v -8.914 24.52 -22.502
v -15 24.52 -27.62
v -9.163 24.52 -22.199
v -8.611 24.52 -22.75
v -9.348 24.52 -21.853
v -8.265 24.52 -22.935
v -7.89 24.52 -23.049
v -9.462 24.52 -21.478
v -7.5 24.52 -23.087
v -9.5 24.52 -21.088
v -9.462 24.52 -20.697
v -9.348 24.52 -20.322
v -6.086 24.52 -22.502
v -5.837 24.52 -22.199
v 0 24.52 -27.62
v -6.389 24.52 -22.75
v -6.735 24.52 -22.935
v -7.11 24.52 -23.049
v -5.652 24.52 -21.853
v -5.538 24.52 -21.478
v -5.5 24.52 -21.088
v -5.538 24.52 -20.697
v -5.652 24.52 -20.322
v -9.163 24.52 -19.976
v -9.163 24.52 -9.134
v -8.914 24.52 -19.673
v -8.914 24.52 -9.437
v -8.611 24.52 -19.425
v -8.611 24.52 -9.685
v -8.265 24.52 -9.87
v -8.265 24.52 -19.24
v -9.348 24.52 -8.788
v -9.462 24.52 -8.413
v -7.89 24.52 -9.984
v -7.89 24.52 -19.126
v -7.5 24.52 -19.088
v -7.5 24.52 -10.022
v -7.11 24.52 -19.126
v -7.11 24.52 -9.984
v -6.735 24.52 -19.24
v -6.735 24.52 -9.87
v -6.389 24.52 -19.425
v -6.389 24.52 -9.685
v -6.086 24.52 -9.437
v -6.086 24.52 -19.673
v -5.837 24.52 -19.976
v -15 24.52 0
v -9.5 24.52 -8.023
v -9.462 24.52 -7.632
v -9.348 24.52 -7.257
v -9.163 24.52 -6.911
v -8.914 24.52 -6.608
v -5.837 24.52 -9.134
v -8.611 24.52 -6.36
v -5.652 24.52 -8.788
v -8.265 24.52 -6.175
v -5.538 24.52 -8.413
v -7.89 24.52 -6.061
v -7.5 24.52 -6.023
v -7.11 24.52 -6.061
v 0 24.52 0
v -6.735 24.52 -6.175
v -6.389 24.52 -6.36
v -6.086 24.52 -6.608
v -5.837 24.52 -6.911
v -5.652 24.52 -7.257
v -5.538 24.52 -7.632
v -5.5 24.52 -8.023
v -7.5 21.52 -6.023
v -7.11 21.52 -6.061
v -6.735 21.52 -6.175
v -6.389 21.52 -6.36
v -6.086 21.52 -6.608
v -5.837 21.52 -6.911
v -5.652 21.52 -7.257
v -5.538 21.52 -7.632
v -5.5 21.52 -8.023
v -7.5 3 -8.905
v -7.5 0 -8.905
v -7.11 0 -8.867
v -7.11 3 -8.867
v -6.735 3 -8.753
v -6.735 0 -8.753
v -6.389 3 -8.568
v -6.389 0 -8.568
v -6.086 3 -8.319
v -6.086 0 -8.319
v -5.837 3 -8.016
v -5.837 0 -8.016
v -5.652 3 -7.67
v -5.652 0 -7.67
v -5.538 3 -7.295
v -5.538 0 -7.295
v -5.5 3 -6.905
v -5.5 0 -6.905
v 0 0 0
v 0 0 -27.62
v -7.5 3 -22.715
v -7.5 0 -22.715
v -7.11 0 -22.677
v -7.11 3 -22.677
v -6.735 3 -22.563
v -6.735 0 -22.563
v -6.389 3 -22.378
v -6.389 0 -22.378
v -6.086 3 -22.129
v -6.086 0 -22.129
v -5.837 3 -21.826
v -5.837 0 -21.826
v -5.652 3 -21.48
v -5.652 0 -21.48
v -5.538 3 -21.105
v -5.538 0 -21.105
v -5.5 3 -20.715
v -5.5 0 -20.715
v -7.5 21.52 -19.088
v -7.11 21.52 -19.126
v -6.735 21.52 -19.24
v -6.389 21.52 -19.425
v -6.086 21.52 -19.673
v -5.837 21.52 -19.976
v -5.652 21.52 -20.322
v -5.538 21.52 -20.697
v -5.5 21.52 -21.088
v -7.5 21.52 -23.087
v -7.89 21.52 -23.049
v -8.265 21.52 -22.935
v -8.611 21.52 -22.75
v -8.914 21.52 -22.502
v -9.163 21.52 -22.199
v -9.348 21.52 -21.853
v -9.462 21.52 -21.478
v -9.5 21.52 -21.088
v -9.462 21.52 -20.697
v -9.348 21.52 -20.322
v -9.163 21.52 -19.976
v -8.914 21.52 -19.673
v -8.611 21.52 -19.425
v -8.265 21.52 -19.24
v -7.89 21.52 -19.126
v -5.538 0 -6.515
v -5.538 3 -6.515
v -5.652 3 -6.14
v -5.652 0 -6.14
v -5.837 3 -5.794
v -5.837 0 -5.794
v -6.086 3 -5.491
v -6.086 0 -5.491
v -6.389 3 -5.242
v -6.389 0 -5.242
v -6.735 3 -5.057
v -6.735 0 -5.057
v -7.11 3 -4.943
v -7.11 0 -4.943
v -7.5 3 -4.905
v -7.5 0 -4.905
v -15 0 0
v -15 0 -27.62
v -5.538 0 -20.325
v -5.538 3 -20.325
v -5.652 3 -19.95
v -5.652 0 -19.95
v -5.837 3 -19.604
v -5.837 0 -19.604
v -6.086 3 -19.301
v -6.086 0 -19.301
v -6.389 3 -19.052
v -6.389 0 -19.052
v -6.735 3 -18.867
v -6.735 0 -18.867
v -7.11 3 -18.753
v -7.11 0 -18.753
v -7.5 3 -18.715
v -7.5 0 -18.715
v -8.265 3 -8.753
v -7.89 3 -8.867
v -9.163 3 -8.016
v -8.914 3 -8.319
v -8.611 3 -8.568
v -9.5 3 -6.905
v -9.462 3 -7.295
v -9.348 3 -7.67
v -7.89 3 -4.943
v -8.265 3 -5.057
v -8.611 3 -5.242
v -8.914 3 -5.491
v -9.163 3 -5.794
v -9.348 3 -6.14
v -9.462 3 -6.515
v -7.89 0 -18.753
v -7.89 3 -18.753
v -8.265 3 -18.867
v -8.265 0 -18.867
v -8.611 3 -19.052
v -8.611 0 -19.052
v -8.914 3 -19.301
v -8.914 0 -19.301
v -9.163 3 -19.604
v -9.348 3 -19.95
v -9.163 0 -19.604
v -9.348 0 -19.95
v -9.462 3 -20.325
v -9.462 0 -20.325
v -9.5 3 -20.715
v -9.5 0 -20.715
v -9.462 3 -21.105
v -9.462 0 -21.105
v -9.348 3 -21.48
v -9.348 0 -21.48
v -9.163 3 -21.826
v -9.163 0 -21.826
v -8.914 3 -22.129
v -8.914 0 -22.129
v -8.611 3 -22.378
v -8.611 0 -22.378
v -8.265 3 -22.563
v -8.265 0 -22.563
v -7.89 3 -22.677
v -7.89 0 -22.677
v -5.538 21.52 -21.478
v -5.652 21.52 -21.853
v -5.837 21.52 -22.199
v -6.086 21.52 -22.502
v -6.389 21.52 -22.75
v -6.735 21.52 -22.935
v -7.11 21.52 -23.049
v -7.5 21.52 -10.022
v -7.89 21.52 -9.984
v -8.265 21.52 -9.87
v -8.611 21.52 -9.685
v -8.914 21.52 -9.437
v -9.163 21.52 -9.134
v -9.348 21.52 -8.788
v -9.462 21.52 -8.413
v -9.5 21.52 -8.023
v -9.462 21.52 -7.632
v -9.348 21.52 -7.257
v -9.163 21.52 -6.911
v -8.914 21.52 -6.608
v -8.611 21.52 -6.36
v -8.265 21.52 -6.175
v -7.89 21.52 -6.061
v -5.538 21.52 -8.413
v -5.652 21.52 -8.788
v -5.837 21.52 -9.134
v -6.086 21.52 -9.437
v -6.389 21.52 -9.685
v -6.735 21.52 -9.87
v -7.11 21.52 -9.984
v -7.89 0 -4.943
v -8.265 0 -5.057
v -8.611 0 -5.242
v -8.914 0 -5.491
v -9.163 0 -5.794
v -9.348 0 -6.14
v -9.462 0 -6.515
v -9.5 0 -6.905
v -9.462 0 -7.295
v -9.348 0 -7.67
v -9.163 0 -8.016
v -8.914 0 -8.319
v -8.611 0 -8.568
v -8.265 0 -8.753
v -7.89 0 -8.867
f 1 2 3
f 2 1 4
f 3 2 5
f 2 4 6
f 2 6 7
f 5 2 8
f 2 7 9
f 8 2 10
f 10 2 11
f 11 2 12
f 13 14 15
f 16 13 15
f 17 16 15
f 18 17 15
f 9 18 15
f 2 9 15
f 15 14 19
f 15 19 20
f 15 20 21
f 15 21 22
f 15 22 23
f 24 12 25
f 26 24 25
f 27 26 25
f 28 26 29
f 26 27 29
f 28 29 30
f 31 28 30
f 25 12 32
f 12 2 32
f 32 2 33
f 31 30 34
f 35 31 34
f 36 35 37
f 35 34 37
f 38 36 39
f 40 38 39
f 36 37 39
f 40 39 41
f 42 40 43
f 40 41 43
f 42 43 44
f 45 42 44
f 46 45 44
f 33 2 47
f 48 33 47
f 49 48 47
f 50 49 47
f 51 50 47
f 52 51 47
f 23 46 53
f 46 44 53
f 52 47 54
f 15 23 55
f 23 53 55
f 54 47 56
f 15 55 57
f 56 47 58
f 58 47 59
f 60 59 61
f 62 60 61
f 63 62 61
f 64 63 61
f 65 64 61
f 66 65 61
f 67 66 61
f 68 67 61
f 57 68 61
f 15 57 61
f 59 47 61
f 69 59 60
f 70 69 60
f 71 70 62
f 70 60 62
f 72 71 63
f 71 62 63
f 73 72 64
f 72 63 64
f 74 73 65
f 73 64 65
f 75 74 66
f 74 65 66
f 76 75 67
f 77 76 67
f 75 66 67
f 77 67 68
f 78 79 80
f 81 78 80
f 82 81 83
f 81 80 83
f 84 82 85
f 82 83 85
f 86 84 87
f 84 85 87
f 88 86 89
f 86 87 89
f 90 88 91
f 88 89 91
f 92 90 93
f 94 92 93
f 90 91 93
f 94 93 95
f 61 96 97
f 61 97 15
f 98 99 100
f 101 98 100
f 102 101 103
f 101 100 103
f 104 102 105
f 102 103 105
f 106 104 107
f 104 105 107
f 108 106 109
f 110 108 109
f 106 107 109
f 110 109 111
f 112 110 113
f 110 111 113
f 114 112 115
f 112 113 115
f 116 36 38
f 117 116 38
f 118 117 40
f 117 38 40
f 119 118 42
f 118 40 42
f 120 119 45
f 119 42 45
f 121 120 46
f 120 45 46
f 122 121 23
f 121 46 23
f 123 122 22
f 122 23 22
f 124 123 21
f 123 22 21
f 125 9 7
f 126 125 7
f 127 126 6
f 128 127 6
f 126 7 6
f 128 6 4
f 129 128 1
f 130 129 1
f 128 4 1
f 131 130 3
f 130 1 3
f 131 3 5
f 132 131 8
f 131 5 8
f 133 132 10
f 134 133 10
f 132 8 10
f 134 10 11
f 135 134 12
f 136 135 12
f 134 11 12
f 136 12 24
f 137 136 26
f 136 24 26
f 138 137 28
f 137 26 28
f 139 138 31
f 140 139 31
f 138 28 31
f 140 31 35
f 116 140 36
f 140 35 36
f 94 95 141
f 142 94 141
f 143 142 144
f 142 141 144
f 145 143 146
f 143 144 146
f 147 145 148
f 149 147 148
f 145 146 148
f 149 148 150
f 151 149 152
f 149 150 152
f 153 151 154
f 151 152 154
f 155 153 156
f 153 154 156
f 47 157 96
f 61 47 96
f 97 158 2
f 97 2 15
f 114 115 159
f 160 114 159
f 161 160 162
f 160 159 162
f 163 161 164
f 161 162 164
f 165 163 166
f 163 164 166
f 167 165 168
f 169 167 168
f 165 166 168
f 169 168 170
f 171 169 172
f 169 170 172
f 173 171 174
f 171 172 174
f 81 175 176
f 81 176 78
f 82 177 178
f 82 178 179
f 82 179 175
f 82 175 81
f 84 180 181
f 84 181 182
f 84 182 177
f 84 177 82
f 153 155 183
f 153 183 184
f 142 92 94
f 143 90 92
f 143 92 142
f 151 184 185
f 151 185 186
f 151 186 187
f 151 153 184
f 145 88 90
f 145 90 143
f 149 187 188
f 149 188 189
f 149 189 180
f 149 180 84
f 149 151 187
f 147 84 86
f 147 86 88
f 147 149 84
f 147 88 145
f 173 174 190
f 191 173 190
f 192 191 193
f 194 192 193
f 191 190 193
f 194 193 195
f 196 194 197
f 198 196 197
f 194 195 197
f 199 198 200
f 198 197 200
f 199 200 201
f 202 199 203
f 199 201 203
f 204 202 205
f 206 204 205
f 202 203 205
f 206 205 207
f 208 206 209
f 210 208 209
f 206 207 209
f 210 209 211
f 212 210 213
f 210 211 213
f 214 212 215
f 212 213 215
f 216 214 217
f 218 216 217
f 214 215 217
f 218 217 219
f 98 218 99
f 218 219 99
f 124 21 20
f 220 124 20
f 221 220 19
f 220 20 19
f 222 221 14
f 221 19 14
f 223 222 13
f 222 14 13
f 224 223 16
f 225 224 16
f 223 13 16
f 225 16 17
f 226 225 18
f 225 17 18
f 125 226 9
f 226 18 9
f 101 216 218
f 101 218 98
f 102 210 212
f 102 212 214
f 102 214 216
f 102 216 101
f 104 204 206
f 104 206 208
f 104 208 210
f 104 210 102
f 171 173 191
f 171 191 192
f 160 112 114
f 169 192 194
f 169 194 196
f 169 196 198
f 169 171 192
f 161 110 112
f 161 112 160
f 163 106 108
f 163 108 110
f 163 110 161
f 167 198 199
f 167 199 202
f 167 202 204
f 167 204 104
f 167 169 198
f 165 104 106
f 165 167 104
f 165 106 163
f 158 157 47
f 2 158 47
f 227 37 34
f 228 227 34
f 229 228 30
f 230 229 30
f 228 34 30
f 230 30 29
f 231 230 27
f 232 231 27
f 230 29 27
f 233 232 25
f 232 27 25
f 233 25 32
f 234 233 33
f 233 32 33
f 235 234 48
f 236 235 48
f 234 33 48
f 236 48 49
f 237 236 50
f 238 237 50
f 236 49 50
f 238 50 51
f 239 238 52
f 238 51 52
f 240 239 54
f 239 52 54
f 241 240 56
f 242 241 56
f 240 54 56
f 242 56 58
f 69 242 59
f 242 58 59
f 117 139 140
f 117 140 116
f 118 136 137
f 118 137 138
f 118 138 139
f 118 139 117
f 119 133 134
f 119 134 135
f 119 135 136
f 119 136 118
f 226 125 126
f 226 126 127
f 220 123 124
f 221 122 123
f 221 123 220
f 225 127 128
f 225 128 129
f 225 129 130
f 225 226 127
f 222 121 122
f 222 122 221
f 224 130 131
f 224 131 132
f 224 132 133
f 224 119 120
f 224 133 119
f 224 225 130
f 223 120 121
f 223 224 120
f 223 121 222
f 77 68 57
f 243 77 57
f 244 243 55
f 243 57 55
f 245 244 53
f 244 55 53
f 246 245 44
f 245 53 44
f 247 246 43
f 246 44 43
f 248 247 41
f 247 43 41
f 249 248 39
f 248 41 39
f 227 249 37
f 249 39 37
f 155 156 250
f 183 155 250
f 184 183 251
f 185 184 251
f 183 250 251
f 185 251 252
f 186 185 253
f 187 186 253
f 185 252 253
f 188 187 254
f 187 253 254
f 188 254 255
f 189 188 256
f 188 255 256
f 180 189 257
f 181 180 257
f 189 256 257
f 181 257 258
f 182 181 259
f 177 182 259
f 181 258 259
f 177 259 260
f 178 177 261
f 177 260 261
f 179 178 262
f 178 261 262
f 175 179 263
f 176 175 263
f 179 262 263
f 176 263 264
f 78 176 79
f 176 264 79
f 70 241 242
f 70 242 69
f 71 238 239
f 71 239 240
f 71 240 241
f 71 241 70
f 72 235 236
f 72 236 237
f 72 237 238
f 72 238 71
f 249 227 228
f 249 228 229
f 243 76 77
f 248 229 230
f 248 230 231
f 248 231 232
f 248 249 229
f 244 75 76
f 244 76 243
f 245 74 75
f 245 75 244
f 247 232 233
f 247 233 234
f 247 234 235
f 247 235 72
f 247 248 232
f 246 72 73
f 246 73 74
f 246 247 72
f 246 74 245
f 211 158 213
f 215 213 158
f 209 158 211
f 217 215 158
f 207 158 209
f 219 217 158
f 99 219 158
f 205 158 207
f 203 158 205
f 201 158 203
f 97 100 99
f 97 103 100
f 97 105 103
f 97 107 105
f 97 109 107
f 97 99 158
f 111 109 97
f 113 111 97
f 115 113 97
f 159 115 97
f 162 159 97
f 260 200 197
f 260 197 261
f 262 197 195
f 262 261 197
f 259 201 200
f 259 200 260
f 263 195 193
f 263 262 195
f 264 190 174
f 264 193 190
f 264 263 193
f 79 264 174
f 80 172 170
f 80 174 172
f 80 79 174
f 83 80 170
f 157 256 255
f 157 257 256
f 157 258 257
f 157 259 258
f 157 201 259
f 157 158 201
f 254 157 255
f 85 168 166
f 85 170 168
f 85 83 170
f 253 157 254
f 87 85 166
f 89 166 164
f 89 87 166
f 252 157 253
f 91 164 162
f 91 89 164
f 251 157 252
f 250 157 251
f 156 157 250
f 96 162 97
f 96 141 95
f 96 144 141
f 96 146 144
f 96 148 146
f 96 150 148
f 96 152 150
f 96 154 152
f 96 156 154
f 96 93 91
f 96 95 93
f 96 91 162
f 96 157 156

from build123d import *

# Parameters (mm, degrees)
ESQUISSE1_W             = 15
ESQUISSE1_H             = 24.52
BOSS_EXTRU_1_DEPTH      = 27.62
ENL_V_MAT_EXTRU_1_DEPTH = 3
ENL_V_MAT_EXTRU_2_DEPTH = 3


with BuildPart() as part:
    # Esquisse1 → Boss.-Extru.1 (new body)
    with BuildSketch(Plane.XY):
        with Locations((-7.5, 12.26)):
            Rectangle(ESQUISSE1_W, ESQUISSE1_H)
    extrude(amount=-BOSS_EXTRU_1_DEPTH)

    # Esquisse2 → Enlèv. mat.-Extru.1 (cut)
    with BuildSketch(Plane(origin=(0, 24.52, 0), x_dir=(1, 0, 0), z_dir=(0, 1, 0))):
        with BuildLine():
            ThreePointArc((-7.5, 23.0875), (-9.5, 21.0875), (-7.5, 19.0875))
            Line((-7.5, 19.0875), (-7.5, 23.0875))
        make_face()
        with BuildLine():
            Line((-7.5, 23.0875), (-7.5, 19.0875))
            ThreePointArc((-7.5, 19.0875), (-6.085786438, 19.673286438), (-5.5, 21.0875))
            ThreePointArc((-5.5, 21.0875), (-6.085786438, 22.501713562), (-7.5, 23.0875))
        make_face()
        with BuildLine():
            ThreePointArc((-5.5, 8.0225), (-6.085786438, 9.436713562), (-7.5, 10.0225))
            Line((-7.5, 10.0225), (-7.5, 6.0225))
            ThreePointArc((-7.5, 6.0225), (-6.085786438, 6.608286438), (-5.5, 8.0225))
        make_face()
        with BuildLine():
            Line((-7.5, 6.0225), (-7.5, 10.0225))
            ThreePointArc((-7.5, 10.0225), (-9.5, 8.0225), (-7.5, 6.0225))
        make_face()
    extrude(amount=-ENL_V_MAT_EXTRU_1_DEPTH, mode=Mode.SUBTRACT)

    # Esquisse3 → Enlèv. mat.-Extru.2 (cut)
    with BuildSketch(Plane.XZ):
        with BuildLine():
            ThreePointArc((-7.5, -4.905), (-9.5, -6.905), (-7.5, -8.905))
            Line((-7.5, -8.905), (-7.5, -4.905))
        make_face()
        with BuildLine():
            Line((-7.5, -4.905), (-7.5, -8.905))
            ThreePointArc((-7.5, -8.905), (-6.085786438, -8.319213562), (-5.5, -6.905))
            ThreePointArc((-5.5, -6.905), (-6.085786438, -5.490786438), (-7.5, -4.905))
        make_face()
        with BuildLine():
            ThreePointArc((-5.5, -20.715), (-6.085786438, -19.300786438), (-7.5, -18.715))
            Line((-7.5, -18.715), (-7.5, -22.715))
            ThreePointArc((-7.5, -22.715), (-6.085786438, -22.129213562), (-5.5, -20.715))
        make_face()
        with BuildLine():
            Line((-7.5, -22.715), (-7.5, -18.715))
            ThreePointArc((-7.5, -18.715), (-9.5, -20.715), (-7.5, -22.715))
        make_face()
    extrude(amount=-ENL_V_MAT_EXTRU_2_DEPTH, mode=Mode.SUBTRACT)


solid = part.part
